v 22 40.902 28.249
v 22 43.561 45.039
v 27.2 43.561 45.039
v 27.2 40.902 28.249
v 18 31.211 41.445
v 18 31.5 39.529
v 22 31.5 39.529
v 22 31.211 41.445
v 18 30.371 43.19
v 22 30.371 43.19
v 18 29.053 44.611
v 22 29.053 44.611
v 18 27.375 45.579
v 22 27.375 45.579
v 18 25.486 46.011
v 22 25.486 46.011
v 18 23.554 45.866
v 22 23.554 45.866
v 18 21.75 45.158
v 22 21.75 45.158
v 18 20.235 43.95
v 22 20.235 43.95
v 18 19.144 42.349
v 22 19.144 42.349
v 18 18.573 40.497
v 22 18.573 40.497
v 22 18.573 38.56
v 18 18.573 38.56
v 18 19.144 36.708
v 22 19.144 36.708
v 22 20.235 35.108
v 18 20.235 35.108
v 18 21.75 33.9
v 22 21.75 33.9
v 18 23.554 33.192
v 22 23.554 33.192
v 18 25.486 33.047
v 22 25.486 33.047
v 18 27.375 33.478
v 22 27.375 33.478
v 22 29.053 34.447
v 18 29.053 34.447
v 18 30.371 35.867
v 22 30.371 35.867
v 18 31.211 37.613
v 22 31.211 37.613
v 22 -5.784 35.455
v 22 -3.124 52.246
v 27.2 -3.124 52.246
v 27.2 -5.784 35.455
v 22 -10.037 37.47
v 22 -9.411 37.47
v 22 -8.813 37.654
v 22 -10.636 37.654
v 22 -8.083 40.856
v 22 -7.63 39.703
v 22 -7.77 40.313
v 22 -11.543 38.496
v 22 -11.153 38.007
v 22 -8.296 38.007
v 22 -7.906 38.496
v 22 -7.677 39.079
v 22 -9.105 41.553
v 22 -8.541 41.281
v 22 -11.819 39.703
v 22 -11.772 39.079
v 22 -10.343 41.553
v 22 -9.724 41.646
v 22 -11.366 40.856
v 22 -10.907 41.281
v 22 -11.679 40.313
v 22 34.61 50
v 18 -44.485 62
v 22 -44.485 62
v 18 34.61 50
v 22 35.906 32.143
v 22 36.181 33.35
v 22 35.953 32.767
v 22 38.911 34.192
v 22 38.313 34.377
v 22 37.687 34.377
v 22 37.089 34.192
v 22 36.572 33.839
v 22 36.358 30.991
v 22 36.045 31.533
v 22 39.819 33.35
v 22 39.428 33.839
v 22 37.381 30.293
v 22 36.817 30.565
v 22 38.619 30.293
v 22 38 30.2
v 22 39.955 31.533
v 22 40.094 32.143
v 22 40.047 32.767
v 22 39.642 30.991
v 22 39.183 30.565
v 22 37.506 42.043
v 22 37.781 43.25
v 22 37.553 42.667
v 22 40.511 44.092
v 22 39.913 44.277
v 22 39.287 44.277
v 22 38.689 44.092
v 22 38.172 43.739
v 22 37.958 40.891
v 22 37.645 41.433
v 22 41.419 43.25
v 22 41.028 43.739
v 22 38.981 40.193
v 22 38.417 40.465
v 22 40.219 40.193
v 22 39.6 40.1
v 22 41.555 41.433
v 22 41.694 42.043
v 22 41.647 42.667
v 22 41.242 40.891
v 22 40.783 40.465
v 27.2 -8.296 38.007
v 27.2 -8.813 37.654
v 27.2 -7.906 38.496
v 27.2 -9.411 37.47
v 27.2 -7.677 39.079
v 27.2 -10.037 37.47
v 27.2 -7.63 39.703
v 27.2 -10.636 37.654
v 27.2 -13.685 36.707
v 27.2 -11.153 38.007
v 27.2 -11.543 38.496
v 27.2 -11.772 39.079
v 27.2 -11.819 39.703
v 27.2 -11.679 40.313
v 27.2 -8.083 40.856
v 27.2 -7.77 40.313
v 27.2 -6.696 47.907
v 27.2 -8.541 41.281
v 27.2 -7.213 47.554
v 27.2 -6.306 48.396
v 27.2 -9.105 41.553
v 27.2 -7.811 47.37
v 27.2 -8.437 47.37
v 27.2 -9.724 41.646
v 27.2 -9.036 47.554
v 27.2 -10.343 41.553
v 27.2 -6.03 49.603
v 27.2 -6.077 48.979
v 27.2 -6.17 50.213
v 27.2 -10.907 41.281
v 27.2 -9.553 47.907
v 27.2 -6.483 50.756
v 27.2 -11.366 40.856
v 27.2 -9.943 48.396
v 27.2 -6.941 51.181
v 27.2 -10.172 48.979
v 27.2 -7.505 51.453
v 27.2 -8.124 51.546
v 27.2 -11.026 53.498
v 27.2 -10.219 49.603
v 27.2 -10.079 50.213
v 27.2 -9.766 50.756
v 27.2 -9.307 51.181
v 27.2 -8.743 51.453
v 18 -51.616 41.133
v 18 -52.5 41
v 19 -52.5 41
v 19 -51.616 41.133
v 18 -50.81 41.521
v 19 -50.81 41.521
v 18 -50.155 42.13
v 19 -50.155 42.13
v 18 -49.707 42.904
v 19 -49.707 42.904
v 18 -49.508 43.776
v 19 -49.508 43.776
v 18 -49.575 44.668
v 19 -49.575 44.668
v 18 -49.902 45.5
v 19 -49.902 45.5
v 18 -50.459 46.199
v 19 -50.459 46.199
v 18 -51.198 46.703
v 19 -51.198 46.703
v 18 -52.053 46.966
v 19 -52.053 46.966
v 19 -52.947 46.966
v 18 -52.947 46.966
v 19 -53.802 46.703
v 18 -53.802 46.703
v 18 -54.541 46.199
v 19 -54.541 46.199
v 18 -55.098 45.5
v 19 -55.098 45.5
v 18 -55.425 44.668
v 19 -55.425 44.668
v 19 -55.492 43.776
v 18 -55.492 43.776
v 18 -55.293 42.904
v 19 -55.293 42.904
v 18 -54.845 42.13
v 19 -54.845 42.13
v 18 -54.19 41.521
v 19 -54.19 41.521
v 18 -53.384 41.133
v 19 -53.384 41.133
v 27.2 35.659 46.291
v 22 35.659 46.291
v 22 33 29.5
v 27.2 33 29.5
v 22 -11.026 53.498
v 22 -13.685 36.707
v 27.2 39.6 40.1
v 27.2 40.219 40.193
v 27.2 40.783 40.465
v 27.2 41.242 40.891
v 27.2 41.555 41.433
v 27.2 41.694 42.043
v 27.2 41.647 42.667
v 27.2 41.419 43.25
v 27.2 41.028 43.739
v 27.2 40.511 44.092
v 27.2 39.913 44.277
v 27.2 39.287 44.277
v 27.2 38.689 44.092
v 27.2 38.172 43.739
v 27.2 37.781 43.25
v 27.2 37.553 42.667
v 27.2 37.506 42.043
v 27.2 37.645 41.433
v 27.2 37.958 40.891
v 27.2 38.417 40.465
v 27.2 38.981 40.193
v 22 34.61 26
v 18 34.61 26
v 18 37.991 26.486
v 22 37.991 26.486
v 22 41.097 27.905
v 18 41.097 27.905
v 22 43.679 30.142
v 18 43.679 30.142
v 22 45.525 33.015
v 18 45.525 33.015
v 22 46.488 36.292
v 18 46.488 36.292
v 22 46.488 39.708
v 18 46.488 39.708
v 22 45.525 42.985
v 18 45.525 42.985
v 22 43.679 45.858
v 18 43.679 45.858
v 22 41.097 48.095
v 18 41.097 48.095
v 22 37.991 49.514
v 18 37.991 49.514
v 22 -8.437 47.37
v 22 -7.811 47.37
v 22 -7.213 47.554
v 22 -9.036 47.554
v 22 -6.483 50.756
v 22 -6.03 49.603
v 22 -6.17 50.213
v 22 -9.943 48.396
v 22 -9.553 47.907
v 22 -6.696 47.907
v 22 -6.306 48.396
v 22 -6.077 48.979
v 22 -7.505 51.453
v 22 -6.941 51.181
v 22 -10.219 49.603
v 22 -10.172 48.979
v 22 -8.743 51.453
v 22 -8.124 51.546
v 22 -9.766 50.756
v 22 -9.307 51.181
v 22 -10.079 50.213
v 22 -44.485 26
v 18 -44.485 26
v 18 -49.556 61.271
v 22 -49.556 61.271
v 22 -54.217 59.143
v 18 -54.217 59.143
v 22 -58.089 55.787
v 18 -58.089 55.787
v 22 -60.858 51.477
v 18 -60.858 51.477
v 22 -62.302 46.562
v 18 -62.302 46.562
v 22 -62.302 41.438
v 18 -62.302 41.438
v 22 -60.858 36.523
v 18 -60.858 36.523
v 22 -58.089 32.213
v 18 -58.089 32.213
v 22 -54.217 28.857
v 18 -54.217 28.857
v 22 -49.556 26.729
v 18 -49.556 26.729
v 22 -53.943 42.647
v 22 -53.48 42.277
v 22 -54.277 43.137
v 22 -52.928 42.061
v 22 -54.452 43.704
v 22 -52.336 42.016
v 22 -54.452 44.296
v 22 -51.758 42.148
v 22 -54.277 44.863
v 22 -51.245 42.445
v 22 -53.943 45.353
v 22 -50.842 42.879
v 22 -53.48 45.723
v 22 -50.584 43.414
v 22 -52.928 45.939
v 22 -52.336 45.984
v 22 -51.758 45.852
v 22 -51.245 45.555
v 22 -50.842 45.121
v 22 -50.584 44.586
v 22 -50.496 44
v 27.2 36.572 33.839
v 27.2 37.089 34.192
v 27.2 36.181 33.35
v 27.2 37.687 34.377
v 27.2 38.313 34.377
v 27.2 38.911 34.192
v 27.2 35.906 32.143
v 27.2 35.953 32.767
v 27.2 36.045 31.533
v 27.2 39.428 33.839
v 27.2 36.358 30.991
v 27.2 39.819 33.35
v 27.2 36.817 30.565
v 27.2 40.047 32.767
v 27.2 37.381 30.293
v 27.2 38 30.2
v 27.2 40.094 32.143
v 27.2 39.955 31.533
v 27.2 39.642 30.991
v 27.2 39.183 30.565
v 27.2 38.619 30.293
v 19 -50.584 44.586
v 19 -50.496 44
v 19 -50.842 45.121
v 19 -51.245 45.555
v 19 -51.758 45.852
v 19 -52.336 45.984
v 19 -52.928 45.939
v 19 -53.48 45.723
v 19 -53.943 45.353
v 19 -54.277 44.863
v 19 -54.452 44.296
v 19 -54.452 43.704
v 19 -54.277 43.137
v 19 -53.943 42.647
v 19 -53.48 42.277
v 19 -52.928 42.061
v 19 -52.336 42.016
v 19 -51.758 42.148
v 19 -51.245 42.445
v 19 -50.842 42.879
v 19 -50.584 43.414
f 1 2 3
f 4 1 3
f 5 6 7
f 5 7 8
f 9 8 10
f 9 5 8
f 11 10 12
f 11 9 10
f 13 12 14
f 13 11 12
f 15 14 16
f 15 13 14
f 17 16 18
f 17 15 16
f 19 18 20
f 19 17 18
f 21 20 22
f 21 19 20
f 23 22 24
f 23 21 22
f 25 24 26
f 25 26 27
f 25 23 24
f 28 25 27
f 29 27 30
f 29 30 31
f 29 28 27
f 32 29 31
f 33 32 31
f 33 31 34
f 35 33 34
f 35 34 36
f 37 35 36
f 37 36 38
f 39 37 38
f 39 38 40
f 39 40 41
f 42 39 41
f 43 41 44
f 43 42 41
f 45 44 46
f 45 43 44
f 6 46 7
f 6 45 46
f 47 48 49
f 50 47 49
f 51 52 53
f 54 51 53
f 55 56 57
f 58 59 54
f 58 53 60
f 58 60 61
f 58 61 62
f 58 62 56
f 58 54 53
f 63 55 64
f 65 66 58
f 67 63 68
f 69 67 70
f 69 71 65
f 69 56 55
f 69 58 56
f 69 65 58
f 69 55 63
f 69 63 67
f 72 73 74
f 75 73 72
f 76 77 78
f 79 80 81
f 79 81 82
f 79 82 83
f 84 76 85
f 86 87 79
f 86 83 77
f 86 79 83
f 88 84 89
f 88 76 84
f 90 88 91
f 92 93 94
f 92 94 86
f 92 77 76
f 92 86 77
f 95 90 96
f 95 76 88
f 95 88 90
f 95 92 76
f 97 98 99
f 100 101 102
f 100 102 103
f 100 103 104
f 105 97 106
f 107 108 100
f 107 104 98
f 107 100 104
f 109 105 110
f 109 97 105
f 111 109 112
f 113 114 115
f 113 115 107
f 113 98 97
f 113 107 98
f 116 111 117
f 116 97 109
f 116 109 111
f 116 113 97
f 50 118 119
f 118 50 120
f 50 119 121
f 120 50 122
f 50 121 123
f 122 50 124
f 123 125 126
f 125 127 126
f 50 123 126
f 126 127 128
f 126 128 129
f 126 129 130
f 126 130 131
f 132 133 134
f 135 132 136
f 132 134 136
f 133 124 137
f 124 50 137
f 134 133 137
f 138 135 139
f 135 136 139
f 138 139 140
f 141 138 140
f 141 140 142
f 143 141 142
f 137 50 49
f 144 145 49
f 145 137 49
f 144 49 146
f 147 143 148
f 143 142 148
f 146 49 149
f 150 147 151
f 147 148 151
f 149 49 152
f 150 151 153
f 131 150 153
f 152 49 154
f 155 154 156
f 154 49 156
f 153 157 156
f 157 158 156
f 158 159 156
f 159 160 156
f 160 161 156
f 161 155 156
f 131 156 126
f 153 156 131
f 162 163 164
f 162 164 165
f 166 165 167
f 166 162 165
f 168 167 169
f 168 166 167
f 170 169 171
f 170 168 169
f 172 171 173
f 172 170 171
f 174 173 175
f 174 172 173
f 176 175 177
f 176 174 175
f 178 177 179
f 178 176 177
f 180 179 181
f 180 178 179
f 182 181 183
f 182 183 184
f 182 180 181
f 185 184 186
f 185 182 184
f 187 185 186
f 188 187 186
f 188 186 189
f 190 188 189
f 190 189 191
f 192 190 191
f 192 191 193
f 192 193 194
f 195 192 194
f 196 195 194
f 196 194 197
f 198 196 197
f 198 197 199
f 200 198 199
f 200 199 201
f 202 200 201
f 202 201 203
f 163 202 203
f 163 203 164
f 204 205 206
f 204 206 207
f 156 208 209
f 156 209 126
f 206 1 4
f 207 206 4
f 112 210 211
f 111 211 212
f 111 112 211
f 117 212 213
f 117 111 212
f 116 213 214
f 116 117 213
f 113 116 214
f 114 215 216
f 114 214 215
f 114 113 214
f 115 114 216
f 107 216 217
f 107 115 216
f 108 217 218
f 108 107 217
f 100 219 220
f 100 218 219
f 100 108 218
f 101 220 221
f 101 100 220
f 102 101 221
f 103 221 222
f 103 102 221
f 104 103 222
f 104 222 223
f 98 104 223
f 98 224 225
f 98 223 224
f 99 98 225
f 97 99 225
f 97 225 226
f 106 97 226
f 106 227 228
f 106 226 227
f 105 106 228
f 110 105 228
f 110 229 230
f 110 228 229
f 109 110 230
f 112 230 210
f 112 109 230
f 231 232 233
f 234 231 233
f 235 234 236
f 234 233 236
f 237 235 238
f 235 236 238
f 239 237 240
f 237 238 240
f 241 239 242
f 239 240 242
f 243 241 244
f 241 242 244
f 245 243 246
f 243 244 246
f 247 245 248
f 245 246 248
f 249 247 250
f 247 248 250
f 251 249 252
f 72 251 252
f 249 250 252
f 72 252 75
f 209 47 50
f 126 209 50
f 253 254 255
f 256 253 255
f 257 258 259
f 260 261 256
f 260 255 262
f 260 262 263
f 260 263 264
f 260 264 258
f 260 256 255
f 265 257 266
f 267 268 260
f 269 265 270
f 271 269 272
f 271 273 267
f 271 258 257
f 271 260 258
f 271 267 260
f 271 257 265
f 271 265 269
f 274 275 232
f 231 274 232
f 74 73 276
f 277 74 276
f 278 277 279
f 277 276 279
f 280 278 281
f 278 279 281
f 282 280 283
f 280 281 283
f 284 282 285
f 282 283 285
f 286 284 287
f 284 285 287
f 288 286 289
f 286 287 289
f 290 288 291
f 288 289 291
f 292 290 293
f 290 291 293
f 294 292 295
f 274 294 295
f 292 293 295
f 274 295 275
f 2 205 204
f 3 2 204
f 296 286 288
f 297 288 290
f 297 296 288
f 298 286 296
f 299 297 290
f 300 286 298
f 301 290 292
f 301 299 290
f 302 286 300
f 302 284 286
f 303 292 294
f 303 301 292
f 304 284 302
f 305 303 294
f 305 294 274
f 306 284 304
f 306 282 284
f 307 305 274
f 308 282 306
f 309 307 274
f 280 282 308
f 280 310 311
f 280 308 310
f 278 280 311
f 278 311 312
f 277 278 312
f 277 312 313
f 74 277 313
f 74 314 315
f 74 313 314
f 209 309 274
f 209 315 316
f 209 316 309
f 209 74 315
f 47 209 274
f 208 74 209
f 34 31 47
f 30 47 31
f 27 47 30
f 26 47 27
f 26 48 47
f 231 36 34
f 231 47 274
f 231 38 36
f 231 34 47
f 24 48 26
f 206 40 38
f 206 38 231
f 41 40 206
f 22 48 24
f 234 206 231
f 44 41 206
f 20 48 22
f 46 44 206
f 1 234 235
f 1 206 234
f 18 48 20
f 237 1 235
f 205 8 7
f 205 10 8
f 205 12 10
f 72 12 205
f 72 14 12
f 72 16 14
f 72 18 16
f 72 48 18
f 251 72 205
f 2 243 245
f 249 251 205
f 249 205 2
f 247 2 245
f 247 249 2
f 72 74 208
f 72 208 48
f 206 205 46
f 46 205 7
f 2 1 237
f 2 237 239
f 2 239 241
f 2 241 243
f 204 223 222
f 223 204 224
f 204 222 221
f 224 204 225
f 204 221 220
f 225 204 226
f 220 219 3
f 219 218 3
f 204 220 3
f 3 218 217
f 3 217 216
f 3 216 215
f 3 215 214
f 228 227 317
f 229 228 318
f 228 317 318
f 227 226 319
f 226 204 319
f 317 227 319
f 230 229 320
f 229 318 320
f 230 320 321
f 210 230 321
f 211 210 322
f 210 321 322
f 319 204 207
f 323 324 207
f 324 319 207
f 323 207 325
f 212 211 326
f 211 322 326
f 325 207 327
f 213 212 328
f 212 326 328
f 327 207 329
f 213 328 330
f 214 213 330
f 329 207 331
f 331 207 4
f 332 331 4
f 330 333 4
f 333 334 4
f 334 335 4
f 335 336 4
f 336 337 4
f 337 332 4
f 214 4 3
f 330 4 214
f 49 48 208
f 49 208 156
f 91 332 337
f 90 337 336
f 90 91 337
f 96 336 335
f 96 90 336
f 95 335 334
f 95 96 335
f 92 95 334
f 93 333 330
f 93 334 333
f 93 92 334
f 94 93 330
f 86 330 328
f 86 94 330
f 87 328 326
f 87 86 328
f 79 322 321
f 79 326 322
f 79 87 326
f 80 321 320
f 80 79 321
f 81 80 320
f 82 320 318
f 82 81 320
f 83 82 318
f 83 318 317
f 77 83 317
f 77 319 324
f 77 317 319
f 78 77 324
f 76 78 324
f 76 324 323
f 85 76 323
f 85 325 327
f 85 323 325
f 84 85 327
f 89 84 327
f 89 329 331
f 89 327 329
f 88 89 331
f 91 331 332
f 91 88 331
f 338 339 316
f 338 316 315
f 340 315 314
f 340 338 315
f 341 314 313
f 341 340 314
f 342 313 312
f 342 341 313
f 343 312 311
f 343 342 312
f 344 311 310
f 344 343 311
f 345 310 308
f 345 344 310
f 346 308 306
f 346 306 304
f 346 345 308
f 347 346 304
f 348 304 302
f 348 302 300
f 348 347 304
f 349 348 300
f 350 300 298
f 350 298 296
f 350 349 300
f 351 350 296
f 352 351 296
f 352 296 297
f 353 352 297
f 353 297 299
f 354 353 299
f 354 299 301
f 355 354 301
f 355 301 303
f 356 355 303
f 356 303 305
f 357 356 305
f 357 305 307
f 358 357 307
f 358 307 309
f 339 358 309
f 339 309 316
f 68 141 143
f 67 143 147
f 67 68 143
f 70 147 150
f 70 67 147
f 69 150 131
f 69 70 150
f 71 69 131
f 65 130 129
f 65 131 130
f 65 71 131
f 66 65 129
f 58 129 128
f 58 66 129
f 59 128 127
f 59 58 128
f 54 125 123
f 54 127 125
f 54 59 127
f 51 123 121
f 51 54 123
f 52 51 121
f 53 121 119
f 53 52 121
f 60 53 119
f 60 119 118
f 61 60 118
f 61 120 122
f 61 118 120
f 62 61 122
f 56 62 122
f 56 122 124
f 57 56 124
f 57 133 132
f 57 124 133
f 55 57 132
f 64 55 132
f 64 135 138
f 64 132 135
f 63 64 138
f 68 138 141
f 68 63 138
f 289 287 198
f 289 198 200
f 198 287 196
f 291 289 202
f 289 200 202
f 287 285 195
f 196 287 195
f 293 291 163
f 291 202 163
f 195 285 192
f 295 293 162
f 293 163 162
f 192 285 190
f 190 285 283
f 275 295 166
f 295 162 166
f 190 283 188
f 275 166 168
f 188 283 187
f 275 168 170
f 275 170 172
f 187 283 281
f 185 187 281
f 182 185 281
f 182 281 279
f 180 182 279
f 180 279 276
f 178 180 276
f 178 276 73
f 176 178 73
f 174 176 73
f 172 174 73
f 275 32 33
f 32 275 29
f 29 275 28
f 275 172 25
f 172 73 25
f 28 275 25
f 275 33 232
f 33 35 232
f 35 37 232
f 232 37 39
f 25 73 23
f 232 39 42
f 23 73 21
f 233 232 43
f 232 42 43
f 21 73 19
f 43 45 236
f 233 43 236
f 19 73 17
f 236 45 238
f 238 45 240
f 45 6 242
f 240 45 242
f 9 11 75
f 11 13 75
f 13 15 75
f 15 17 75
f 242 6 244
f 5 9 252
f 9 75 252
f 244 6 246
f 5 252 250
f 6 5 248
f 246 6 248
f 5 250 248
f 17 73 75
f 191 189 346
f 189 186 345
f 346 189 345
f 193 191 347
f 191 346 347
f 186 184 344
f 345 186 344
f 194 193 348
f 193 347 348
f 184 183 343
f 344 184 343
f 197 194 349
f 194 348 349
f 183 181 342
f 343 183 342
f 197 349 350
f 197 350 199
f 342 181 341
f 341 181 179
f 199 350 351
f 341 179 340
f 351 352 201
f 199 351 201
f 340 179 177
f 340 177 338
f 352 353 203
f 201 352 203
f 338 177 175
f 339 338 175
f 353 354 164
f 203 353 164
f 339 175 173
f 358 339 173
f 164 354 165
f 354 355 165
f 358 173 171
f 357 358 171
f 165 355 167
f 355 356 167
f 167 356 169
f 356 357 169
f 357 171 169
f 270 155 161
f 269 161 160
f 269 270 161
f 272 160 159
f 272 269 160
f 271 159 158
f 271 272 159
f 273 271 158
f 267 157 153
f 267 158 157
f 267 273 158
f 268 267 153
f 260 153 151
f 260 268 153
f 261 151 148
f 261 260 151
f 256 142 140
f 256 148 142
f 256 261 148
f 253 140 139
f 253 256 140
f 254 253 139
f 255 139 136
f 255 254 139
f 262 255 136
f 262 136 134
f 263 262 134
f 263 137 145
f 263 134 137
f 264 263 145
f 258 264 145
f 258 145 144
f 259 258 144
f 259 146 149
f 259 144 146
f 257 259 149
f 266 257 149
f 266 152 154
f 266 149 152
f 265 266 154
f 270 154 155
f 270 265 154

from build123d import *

# Parameters (mm, degrees)
CYLINDER007_R          = 3
CYLINDER007_DEPTH      = 10
CYLINDER004_R          = 2.1
CYLINDER004_DEPTH      = 10
CYLINDER003_R          = 2.1
CYLINDER003_DEPTH      = 10
BOX001_W               = 7
BOX001_H               = 8
BOX001_DEPTH           = 17
BOX001_PLACEMENT_ANGLE = 9
SKETCH002_R            = 6.5
SKETCH002_R_2          = 1.98925
PAD002_DEPTH           = 4
CYLINDER006_R          = 2.1
CYLINDER006_DEPTH      = 10
CYLINDER005_R          = 2.1
CYLINDER005_DEPTH      = 10
BOX002_W               = 7
BOX002_H               = 8
BOX002_DEPTH           = 17
BOX002_PLACEMENT_ANGLE = 9
CUT003_PLACEMENT_ANGLE = 180


with BuildPart() as cylinder007:
    # Cylinder007 → Cylinder007 (new body)
    with BuildSketch(Plane(origin=(9, -52.5, 44), x_dir=(0, 0, -1), z_dir=(1, 0, 0))):
        Circle(CYLINDER007_R)
    extrude(amount=CYLINDER007_DEPTH)


with BuildPart() as cylinder004:
    # Cylinder004 → Cylinder004 (new body)
    with BuildSketch(Plane(origin=(23, 39.6, 42.2), x_dir=(0, 0, -1), z_dir=(1, 0, 0))):
        Circle(CYLINDER004_R)
    extrude(amount=CYLINDER004_DEPTH)


with BuildPart() as fusion001:
    # Cylinder003 → Cylinder003 (new body)
    with BuildSketch(Plane(origin=(23, 38, 32.3), x_dir=(0, 0, -1), z_dir=(1, 0, 0))):
        Circle(CYLINDER003_R)
    extrude(amount=CYLINDER003_DEPTH)

    # Fusion001: union Cylinder004
    add(cylinder004.part)


with BuildPart() as fusion001_1:
    # Fusion001 placement: moved
    add(fusion001.part.moved(Location((-1, 0, 0))))


with BuildPart() as cut002:
    # Box001 → Box001 (new body)
    with BuildSketch(Plane.XY):
        with Locations((3.5, 4)):
            Rectangle(BOX001_W, BOX001_H)
    extrude(amount=BOX001_DEPTH)


with BuildPart() as cut002_1:
    # Box001 placement: moved
    add(cut002.part.moved(Location((20.2, 33, 29.5))).rotate(Axis((20.2, 33, 29.5), (-1, 0, 0)), BOX001_PLACEMENT_ANGLE))

    # Cut002: cut Fusion001
    add(fusion001_1.part, mode=Mode.SUBTRACT)


with BuildPart() as arribarodilla:
    # Sketch002 → Pad002 (new body)
    with BuildSketch(Plane.YZ):
        with BuildLine():
            Line((-19.485119, 0), (59.609761, 0))
            ThreePointArc((59.609761, 0), (71.609761, 12), (59.609761, 24))
            Line((-19.485119, 36), (59.609761, 24))
            ThreePointArc((-19.485119, 36), (-37.485119, 18), (-19.485119, 0))
        make_face()
        with Locations((50, 13.528694)):
            Circle(SKETCH002_R, mode=Mode.SUBTRACT)
        with Locations((-27.485119, 18)):
            Circle(SKETCH002_R_2, mode=Mode.SUBTRACT)
    extrude(amount=PAD002_DEPTH)


with BuildPart() as arribarodilla_1:
    # Body002 placement: moved
    add(arribarodilla.part.moved(Location((18, -25, 26))))


with BuildPart() as cylinder006:
    # Cylinder006 → Cylinder006 (new body)
    with BuildSketch(Plane(origin=(23, 39.6, 42.2), x_dir=(0, 0, -1), z_dir=(1, 0, 0))):
        Circle(CYLINDER006_R)
    extrude(amount=CYLINDER006_DEPTH)


with BuildPart() as fusion002:
    # Cylinder005 → Cylinder005 (new body)
    with BuildSketch(Plane(origin=(23, 38, 32.3), x_dir=(0, 0, -1), z_dir=(1, 0, 0))):
        Circle(CYLINDER005_R)
    extrude(amount=CYLINDER005_DEPTH)

    # Fusion002: union Cylinder006
    add(cylinder006.part)


with BuildPart() as fusion002_1:
    # Fusion002 placement: moved
    add(fusion002.part.moved(Location((-1, 0, 0))))


with BuildPart() as cut004:
    # Box002 → Box002 (new body)
    with BuildSketch(Plane.XY):
        with Locations((3.5, 4)):
            Rectangle(BOX002_W, BOX002_H)
    extrude(amount=BOX002_DEPTH)


with BuildPart() as cut004_1:
    # Box002 placement: moved
    add(cut004.part.moved(Location((20.2, 33, 29.5))).rotate(Axis((20.2, 33, 29.5), (-1, 0, 0)), BOX002_PLACEMENT_ANGLE))

    # Cut003: cut Fusion002
    add(fusion002_1.part, mode=Mode.SUBTRACT)


with BuildPart() as cut004_2:
    # Cut003 placement: moved
    add(cut004_1.part.moved(Location((0, 29.8756, 81.7462))).rotate(Axis((0, 29.8756, 81.7462), (1, 0, 0)), CUT003_PLACEMENT_ANGLE))

    # Fusion003: union Cut002, ArribaRodilla
    add(cut002_1.part)
    add(arribarodilla_1.part)

    # Cut004: cut Cylinder007
    add(cylinder007.part, mode=Mode.SUBTRACT)


solid = cut004_2.part
